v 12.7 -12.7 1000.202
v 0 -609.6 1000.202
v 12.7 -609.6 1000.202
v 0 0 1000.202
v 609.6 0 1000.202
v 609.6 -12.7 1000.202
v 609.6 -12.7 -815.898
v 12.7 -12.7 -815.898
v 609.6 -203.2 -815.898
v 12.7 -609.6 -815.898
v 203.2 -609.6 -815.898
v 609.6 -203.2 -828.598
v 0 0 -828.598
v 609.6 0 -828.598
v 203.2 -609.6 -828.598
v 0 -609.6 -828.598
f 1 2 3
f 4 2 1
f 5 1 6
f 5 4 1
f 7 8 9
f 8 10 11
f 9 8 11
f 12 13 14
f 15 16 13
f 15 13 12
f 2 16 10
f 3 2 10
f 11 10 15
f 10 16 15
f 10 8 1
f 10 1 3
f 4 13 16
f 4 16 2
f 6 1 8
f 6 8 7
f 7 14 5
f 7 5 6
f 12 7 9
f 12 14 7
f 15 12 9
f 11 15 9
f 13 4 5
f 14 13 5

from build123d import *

# Parameters (mm, degrees)
F0_W     = 609.6
F0_H     = 1828.8
F1_DEPTH = 12.7
F4_W     = 596.9
F4_H     = 596.9
F5_DEPTH = 12.7
F6_SIZE  = 406.4


# Not quite as in the source:
# - a feature of the source that left no trace in its solid (it failed there, or was rolled back) is left out
# - a pattern or mirror of a feature is missing from the dataset's text; its kind, count and spacing are read off the source's solid


with BuildPart() as f1:
    # F0 (on Front) → F1 (new body)
    with BuildSketch(Plane.XZ):
        with Locations((304.8, 85.8015570831)):
            Rectangle(F0_W, F0_H)
    extrude(amount=F1_DEPTH)

    # F1_copies: F1 across plane


with BuildPart() as f1_1:
    add(f1.part)
    add(f1.part.mirror(Plane(origin=(0, 0, 0), x_dir=(0.7071067812, -0.7071067812, 0), z_dir=(-0.7071067812, -0.7071067812, 0))))

    # F4 (on face) → F5 (join)
    with BuildSketch(Plane(origin=(0, 0, -828.5984429169), x_dir=(1, 0, 0), z_dir=(0, 0, -1))):
        with Locations((311.15, 311.15)):
            Rectangle(F4_W, F4_H)
    extrude(amount=-F5_DEPTH)

    # F6
    f6_edges = [f1_1.edges().sort_by_distance(p)[0] for p in [
        (609.6, -609.6, -822.248443),
    ]]
    chamfer(f6_edges, length=F6_SIZE)


solid = f1_1.part
